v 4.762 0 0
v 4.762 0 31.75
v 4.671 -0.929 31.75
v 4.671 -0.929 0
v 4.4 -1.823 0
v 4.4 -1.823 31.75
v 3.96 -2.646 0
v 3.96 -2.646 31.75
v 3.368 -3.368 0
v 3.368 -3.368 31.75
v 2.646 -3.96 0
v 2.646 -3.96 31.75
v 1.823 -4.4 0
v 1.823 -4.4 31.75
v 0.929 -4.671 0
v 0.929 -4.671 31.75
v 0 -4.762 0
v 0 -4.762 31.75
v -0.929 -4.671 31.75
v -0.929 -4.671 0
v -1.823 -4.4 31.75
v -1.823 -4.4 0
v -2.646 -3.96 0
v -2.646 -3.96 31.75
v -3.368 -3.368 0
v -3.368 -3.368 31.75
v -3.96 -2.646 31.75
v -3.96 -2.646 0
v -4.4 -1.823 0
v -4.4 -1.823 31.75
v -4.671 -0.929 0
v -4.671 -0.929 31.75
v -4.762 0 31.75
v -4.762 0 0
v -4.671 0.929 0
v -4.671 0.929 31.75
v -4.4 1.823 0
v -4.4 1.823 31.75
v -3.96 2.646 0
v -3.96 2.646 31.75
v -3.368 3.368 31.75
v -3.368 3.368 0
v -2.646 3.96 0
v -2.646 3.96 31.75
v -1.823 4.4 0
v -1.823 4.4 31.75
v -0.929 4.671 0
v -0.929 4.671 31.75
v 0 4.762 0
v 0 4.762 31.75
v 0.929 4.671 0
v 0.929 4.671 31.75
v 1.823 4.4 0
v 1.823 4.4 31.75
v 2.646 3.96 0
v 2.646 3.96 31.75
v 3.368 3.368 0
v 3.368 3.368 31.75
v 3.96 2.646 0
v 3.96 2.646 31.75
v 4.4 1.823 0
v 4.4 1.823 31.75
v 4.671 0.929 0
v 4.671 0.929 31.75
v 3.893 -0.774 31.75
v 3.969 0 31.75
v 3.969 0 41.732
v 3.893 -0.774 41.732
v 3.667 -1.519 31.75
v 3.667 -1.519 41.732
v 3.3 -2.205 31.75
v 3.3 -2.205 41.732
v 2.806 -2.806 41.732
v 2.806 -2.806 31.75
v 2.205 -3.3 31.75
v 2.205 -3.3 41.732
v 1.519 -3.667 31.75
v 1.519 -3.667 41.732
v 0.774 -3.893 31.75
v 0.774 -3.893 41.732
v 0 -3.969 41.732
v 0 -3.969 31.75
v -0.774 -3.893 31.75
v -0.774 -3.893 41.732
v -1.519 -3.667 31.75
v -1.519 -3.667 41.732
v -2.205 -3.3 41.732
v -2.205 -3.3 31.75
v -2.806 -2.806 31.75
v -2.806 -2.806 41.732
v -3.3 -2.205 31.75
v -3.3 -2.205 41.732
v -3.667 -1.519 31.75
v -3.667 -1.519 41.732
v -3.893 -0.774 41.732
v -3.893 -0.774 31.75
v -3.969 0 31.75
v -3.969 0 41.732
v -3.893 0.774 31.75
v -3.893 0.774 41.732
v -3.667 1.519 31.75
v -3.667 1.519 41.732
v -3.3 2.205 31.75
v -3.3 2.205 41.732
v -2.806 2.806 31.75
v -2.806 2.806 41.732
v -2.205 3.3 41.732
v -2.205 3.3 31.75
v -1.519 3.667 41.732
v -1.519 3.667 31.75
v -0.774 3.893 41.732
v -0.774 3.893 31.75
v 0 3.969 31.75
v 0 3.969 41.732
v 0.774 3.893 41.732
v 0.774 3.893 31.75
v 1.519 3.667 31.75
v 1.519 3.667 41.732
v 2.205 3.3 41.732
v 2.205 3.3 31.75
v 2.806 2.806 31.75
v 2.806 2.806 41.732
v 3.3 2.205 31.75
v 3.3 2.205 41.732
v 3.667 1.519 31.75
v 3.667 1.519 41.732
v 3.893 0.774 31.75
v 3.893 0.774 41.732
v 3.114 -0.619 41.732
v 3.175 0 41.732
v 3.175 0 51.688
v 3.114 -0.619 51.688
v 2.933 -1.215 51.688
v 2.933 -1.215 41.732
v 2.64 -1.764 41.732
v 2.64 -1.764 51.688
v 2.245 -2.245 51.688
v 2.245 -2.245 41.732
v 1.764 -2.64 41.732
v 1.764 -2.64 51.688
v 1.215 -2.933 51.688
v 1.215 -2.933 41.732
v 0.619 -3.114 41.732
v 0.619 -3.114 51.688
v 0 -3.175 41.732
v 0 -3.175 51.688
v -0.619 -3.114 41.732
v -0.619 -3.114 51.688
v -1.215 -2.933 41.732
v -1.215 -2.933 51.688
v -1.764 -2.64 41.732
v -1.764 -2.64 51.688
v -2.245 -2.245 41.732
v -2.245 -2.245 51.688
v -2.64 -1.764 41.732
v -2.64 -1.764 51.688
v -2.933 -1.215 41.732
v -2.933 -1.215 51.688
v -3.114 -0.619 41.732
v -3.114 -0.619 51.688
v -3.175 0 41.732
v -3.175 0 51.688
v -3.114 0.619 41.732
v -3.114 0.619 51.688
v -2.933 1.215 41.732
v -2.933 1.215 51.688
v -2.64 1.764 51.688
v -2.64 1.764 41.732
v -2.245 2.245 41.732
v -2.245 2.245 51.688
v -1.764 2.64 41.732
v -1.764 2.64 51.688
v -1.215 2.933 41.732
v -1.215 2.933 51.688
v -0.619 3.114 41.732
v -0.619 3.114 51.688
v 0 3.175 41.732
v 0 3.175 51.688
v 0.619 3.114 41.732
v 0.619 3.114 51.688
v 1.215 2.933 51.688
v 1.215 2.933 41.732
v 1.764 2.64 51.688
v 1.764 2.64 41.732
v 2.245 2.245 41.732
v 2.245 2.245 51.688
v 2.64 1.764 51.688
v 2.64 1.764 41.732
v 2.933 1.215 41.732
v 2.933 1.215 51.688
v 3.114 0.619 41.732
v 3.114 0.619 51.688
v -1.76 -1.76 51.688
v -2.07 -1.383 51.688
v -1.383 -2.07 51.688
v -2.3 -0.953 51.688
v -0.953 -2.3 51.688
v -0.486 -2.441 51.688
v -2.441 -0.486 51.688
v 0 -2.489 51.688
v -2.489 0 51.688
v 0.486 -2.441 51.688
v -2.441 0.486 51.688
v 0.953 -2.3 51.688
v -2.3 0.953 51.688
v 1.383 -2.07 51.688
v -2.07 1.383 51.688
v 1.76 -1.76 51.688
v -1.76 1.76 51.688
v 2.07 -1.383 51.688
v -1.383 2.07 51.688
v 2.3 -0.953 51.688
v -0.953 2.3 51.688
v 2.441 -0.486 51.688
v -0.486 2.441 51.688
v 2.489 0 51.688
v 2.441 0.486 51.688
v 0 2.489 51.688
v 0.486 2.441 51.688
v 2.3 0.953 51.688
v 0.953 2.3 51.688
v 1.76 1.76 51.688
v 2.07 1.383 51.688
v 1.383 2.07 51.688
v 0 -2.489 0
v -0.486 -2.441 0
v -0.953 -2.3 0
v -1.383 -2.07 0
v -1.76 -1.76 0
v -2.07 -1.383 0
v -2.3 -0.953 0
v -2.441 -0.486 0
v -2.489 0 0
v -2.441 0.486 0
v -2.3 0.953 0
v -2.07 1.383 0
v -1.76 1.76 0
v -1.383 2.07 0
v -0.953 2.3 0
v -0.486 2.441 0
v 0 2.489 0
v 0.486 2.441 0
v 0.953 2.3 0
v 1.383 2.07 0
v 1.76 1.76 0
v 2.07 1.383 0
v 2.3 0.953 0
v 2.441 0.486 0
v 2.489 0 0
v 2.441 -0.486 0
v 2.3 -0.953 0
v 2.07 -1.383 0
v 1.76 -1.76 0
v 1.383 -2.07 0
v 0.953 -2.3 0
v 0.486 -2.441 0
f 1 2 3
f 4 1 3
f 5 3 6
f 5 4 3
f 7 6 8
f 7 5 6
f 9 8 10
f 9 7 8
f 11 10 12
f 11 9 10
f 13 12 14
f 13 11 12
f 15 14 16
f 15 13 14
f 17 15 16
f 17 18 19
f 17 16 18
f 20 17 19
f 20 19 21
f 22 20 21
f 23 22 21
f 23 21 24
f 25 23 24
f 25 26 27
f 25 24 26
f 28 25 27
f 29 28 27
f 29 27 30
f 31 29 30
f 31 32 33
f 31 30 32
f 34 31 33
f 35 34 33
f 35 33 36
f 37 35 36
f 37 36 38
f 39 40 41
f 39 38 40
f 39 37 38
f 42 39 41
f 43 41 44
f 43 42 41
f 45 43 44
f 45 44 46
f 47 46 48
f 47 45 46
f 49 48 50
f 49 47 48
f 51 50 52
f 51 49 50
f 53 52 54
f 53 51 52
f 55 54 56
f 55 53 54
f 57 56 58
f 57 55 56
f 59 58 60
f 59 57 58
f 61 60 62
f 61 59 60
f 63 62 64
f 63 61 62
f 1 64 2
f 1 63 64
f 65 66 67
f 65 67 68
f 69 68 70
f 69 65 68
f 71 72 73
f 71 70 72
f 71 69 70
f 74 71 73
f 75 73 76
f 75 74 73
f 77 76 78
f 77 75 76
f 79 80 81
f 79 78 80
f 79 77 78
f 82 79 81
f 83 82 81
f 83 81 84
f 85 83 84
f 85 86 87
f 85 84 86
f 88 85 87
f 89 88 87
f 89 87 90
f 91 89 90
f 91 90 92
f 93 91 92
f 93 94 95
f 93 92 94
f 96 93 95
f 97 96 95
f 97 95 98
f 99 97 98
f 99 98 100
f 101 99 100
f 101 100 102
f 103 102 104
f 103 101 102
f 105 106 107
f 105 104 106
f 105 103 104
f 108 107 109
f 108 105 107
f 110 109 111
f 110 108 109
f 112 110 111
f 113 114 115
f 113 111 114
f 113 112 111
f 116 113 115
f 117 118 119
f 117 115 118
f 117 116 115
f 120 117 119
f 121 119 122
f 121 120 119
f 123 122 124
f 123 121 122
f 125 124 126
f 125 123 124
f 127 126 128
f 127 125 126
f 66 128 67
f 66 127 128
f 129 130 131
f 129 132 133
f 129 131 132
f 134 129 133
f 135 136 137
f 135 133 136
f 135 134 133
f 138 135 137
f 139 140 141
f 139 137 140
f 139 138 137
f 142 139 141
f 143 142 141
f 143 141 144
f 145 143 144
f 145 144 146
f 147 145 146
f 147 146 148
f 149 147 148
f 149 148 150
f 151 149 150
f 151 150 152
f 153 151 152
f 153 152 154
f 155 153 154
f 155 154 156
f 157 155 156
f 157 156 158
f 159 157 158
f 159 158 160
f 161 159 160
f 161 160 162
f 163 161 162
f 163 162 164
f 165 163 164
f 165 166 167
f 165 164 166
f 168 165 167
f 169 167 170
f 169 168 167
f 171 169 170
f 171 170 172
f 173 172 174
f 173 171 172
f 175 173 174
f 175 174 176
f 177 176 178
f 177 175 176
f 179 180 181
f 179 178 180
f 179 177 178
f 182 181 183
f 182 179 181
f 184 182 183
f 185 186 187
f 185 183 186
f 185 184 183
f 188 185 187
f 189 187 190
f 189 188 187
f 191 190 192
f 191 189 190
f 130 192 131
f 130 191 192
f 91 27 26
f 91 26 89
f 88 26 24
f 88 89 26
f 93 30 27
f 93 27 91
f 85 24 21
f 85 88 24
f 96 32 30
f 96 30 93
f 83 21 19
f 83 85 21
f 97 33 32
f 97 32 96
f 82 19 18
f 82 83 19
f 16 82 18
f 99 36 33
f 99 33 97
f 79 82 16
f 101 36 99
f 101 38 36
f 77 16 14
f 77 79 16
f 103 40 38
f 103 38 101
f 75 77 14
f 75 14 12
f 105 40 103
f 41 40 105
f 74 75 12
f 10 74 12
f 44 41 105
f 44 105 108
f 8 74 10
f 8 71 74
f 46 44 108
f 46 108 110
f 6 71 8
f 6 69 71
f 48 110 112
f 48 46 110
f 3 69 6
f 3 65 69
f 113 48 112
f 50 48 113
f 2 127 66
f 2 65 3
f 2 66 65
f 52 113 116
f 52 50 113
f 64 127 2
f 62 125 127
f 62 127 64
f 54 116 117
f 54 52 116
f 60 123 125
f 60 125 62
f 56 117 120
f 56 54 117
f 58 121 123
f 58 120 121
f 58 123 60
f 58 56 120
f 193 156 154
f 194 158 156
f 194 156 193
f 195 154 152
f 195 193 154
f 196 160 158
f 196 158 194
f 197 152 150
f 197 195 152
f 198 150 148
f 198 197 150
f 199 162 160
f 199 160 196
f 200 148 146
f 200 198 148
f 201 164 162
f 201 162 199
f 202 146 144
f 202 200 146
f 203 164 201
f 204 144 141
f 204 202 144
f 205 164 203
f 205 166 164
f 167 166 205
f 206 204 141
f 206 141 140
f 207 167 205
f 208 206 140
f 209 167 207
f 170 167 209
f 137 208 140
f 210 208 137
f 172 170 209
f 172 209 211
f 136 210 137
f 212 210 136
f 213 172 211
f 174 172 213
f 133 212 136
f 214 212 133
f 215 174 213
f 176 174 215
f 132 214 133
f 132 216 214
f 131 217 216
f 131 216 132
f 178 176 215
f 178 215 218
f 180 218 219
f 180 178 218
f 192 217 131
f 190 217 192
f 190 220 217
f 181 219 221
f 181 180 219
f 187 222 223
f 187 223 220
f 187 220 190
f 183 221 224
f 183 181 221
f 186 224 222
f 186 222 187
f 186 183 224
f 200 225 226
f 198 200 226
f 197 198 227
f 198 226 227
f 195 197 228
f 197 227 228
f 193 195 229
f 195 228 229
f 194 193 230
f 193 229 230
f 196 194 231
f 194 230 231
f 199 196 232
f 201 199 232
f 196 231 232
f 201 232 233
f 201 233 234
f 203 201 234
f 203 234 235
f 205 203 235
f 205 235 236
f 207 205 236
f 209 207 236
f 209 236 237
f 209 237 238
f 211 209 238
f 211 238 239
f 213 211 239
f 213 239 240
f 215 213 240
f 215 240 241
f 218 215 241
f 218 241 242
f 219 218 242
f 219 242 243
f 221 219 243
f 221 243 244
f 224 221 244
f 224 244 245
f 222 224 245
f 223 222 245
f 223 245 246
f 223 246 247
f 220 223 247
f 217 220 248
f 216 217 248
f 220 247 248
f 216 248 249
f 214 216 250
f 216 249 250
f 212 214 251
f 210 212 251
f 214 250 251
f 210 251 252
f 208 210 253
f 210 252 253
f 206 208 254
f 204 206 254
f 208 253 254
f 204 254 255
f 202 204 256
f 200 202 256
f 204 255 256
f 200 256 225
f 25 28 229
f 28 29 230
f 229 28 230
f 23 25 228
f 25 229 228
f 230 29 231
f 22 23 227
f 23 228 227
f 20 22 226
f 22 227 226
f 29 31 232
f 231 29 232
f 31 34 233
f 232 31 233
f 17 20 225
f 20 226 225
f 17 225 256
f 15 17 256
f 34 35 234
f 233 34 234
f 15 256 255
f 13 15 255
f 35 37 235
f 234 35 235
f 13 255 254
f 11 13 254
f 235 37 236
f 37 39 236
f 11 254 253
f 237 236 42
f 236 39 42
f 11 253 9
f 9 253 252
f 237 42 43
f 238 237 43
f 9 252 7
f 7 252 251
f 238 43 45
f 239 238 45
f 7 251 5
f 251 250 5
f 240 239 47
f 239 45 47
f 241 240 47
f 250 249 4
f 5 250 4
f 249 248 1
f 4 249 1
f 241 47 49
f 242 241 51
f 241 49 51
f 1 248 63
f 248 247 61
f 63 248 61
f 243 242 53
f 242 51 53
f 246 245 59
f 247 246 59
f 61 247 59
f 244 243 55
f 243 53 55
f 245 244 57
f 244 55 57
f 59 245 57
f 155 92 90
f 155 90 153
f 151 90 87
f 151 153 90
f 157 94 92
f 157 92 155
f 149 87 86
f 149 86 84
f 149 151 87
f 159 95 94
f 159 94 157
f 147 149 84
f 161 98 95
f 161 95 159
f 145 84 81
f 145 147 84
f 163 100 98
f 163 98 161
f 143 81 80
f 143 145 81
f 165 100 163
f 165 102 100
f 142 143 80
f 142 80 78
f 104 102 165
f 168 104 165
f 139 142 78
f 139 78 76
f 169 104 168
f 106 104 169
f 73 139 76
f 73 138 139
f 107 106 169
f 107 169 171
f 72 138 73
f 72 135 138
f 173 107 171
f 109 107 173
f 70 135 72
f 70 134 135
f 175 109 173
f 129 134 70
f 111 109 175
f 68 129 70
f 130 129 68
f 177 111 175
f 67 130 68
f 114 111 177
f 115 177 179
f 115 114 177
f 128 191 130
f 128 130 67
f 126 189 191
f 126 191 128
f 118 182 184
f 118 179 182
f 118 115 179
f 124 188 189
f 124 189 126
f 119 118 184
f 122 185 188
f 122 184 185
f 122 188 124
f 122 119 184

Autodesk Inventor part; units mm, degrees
ref_plane "YZ Plane" through (0, 0, 0) normal (1, 0, 0) x (0, 1, 0)
ref_plane "XZ Plane" through (0, 0, 0) normal (0, 1, 0) x (-1, 0, 0)
ref_plane "XY Plane" through (0, 0, 0) normal (0, 0, 1) x (1, 0, 0)
sketch "Sketch1" plane through (0, 0, 0) normal (0, 0, 1) x (1, 0, 0)
  circle A0 centre (0, 0) radius 4.7625
  dimension "d0" = 9.525
extrude "Extrusion1" add sketch "Sketch1" along normal blind 31.75
sketch "Sketch2" plane through (0, 0, 31.75) normal (0, 0, 1) x (1, 0, 0)
  circle A0 centre (0, 0) radius 4.7625 projected
  circle A1 centre (0, 0) radius 3.9688
  dimension "d4" = 7.9375
extrude "Extrusion2" add sketch "Sketch2" along normal blind 9.9817 contours A1
sketch "Sketch3" plane through (0, 0, 41.7317) normal (0, 0, 1) x (1, 0, 0)
  circle A0 centre (0, 0) radius 3.9687 projected
  circle A1 centre (0, 0) radius 3.175
  dimension "d8" = 6.35
extrude "Extrusion3" add sketch "Sketch3" along normal blind 9.9568 contours A1
sketch "Sketch4" plane through (0, 0, 51.6885) normal (0, 0, 1) x (1, 0, 0)
  circle A0 centre (0, 0) radius 3.175 projected
hole "Hole1" at (0, 0, 51.6885) direction (0, 0, -1) diameter 4.9784 end through all clearance for "Socket Head Cap Screw" size "#10" standard "Ansi Unified Screw Threads"
properties part number "Main Connecting Standoff Stepped"
